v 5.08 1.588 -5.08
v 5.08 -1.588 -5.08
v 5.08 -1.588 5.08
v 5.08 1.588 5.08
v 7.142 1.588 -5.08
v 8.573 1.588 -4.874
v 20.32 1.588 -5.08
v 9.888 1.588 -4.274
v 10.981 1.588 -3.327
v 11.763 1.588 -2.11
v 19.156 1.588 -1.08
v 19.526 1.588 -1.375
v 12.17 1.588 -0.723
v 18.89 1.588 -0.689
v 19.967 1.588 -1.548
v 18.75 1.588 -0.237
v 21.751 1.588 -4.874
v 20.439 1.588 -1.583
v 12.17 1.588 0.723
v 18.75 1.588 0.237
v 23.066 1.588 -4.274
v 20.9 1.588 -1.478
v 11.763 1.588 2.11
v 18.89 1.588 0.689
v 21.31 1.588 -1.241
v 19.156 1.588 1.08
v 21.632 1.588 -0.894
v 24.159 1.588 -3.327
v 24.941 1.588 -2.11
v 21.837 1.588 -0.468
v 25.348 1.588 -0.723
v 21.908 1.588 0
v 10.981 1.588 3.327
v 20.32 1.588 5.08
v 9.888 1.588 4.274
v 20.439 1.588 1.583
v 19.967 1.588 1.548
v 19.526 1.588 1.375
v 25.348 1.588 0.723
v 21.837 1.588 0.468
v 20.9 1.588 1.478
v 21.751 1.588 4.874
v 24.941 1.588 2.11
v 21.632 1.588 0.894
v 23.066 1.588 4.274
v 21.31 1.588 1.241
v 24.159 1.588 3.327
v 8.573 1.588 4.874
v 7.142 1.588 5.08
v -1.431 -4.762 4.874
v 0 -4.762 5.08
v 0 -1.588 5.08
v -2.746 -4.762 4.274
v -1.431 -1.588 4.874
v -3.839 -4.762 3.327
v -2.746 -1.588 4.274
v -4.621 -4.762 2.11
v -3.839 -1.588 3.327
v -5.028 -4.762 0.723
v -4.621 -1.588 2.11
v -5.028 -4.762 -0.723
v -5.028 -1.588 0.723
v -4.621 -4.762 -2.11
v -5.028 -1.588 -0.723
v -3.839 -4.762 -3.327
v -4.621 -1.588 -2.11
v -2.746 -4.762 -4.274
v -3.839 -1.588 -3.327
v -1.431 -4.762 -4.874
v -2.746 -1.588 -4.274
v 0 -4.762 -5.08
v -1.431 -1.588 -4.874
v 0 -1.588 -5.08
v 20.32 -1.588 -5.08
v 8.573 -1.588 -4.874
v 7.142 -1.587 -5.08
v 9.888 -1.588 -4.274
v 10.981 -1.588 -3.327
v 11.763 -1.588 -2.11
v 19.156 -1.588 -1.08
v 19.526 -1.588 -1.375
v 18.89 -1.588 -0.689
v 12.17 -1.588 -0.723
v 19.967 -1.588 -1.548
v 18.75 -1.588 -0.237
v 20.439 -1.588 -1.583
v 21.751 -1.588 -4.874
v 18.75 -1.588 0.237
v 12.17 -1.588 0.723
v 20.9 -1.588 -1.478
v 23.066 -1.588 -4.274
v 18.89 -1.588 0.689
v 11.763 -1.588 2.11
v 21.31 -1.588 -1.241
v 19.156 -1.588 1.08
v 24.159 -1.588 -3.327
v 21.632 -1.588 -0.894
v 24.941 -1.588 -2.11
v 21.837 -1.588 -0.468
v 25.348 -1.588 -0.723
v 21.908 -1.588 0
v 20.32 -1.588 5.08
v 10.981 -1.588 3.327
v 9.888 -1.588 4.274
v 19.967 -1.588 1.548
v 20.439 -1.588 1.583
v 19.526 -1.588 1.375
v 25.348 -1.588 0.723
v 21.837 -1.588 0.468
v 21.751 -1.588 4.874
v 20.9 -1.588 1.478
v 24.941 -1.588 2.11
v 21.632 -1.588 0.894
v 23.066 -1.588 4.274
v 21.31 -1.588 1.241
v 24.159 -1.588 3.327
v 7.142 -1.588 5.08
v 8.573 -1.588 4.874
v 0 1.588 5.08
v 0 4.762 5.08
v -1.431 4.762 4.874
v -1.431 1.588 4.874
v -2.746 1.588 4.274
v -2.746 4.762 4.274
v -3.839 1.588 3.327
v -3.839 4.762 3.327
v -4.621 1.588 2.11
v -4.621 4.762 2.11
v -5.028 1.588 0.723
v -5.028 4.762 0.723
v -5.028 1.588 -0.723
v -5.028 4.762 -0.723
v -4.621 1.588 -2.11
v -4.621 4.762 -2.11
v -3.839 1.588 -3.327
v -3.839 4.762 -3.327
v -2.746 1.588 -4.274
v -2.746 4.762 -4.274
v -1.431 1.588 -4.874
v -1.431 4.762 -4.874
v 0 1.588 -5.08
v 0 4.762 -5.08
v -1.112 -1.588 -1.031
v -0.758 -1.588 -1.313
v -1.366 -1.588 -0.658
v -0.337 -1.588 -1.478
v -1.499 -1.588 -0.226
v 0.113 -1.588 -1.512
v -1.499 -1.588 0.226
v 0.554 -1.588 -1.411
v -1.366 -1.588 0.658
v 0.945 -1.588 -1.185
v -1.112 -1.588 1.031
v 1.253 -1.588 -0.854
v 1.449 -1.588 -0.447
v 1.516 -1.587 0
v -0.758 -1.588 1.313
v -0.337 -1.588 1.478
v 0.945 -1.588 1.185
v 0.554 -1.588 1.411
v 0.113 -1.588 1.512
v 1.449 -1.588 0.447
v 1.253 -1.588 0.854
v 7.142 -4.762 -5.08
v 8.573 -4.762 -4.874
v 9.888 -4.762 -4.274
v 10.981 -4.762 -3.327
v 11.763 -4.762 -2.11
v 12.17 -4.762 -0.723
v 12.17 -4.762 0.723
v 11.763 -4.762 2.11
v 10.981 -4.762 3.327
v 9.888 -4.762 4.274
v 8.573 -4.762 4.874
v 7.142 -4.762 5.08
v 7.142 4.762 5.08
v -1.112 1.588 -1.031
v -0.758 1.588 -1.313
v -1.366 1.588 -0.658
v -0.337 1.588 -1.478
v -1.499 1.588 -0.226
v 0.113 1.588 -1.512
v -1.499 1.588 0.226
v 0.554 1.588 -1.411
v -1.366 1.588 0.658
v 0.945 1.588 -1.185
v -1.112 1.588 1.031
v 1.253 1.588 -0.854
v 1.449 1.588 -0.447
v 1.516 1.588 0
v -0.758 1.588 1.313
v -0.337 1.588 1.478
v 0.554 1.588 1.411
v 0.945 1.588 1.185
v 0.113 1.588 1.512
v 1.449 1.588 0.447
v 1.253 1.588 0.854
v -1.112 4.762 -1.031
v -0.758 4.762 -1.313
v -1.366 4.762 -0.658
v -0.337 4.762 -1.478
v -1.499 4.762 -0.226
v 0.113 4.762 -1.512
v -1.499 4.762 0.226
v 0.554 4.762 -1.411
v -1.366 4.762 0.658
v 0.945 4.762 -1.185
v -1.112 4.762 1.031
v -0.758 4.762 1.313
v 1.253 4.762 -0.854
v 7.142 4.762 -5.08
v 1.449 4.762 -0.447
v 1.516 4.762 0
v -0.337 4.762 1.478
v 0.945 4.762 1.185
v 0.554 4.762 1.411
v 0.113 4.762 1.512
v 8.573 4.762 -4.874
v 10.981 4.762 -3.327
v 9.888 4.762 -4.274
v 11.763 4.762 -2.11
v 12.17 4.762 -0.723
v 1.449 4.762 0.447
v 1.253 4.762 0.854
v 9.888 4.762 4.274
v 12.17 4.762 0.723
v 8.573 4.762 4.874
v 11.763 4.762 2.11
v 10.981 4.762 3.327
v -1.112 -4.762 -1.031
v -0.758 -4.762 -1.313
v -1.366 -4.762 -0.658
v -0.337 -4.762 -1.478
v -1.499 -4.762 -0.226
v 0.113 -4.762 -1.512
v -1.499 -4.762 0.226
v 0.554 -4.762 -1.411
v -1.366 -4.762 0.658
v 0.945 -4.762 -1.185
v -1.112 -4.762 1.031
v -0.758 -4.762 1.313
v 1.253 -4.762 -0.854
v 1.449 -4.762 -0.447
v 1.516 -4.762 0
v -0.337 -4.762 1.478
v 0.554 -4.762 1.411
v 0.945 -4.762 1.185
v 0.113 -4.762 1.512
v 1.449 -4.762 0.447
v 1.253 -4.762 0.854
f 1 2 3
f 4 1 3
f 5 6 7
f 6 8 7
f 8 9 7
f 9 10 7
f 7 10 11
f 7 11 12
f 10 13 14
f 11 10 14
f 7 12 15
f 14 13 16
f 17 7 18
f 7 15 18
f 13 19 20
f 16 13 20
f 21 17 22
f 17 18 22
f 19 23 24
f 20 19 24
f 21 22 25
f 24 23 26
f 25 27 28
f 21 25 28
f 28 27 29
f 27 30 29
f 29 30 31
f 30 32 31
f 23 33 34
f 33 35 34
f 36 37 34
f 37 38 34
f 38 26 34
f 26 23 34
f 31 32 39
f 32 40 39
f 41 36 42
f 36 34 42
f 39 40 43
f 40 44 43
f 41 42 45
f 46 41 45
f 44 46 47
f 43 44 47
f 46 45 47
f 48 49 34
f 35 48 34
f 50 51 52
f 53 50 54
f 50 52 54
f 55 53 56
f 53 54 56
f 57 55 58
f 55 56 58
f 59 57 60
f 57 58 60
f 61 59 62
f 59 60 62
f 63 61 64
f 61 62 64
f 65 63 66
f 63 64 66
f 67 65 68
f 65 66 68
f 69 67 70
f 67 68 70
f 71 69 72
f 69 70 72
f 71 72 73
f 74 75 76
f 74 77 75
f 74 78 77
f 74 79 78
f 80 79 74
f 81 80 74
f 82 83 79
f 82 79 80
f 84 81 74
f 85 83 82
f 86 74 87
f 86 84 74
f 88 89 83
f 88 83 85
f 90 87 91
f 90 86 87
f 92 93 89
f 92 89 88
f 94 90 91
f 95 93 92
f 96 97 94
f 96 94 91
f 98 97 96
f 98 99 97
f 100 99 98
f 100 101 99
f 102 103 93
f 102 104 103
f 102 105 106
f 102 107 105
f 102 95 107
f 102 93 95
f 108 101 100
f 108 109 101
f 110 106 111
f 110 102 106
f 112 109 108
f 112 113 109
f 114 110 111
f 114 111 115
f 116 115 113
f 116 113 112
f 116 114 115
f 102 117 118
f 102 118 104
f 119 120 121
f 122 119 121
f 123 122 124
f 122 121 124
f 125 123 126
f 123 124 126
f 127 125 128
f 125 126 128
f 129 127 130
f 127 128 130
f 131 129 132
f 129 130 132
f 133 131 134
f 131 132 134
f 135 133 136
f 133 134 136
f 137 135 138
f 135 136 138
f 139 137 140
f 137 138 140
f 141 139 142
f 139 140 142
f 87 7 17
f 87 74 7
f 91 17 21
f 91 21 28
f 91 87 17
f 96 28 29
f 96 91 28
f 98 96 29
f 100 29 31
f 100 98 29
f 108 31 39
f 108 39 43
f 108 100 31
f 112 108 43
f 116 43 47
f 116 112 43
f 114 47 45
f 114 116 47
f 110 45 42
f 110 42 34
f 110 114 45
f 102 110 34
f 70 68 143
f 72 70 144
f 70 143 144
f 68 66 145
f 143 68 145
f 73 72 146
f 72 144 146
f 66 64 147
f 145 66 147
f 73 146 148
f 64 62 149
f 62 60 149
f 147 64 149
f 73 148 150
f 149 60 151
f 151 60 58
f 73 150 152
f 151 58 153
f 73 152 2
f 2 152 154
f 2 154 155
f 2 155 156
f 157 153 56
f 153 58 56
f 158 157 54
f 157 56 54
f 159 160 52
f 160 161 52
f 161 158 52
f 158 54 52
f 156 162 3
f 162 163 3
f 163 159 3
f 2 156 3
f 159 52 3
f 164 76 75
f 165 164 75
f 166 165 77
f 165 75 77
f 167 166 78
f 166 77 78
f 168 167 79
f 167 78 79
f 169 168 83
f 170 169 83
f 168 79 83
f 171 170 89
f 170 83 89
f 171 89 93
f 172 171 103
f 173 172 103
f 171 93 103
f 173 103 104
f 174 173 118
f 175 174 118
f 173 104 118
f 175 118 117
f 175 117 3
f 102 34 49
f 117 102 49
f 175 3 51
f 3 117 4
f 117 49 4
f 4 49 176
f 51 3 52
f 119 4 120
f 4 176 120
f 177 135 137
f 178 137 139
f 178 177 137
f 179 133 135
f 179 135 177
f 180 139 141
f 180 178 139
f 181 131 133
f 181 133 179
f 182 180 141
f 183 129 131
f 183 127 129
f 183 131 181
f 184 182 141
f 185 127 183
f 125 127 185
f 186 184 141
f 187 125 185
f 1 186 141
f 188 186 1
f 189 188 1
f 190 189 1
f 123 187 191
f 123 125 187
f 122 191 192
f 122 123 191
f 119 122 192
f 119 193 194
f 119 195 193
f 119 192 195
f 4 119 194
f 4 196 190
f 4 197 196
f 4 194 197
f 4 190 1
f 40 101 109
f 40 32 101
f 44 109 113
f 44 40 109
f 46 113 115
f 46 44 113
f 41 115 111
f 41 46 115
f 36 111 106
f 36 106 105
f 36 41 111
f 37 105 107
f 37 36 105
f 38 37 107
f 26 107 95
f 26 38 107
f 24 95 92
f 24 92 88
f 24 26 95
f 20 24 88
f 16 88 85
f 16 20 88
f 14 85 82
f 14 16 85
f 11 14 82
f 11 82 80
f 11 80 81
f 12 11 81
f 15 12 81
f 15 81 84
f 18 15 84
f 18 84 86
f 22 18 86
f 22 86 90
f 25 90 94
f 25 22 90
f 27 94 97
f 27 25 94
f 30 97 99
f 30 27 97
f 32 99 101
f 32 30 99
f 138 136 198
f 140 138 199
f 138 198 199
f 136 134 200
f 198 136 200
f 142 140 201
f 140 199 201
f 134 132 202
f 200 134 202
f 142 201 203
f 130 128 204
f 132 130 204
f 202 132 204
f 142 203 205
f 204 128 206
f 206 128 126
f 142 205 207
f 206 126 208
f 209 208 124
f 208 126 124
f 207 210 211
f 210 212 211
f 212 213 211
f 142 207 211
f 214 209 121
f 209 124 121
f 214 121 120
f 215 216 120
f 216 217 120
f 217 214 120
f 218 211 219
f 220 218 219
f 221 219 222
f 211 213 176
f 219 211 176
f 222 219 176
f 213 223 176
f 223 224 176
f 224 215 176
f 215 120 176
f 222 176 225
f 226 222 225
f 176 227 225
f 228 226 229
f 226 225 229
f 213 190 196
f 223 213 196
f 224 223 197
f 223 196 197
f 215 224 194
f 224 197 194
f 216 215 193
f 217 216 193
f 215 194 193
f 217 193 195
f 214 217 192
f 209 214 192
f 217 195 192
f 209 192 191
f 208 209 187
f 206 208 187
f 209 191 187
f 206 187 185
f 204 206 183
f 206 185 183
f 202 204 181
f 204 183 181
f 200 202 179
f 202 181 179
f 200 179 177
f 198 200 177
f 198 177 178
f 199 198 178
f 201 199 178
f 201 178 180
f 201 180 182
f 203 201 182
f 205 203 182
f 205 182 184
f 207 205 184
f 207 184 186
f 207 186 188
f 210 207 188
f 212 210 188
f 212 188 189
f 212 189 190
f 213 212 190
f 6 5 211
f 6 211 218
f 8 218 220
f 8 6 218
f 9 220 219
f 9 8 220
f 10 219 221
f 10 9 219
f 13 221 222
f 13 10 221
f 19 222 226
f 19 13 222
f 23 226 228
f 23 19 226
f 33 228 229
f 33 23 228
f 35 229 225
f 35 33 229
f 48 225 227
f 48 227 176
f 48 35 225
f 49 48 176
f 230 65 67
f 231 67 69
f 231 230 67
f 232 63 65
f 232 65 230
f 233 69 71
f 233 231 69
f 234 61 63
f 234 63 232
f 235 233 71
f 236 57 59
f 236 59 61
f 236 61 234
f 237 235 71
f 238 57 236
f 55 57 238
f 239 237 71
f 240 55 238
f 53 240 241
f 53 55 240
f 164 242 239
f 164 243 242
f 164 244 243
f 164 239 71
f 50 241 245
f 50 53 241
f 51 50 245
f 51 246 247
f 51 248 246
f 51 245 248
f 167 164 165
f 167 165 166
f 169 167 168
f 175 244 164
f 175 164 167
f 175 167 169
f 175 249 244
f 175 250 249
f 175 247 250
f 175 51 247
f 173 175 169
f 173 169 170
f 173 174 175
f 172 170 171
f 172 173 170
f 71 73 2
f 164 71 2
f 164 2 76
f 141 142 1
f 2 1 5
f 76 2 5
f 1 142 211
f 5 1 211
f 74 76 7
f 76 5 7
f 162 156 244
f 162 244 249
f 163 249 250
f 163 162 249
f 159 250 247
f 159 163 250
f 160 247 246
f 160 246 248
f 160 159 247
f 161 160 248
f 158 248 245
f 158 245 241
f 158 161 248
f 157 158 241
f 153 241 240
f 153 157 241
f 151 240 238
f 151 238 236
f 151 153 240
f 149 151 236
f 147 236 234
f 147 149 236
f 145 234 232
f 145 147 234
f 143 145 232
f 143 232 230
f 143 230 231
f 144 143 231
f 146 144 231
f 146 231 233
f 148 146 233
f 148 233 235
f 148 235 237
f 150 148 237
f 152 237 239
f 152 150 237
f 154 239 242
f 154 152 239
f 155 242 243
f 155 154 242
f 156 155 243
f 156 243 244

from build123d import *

# Parameters (mm, degrees)
F0_R          = 1.5875
F1_DEPTH      = 1.5875
F1_DEPTH_BACK = 1.5875
F2_R          = 1.516292
F3_DEPTH      = 3.175
F3_DEPTH_BACK = 6.35
F4_W          = 11.43
F4_H          = 10.16
F5_DEPTH      = 3.175


with BuildPart() as f1:
    # F0 (on Front) → F1 (new body, two sides)
    with BuildSketch(Plane.XZ) as f1_sk:
        with BuildLine():
            Line((20.32, 5.08), (0, 5.08))
            ThreePointArc((0, 5.08), (-5.08, 0), (0, -5.08))
            Line((0, -5.08), (20.32, -5.08))
            ThreePointArc((20.32, -5.08), (25.4, 0), (20.32, 5.08))
        make_face()
        Circle(F0_R, mode=Mode.SUBTRACT)
        with Locations((20.32, 0)):
            Circle(F0_R, mode=Mode.SUBTRACT)
    extrude(amount=F1_DEPTH)
    extrude(f1_sk.sketch, amount=-F1_DEPTH_BACK)

    # F2 (on face) → F3 (join, two sides)
    with BuildSketch(Plane.XZ.offset(1.5875)) as f3_sk:
        with BuildLine():
            Line((7.141738, 5.08), (0, 5.08))
            ThreePointArc((0, 5.08), (-5.08, 0), (0, -5.08))
            Line((0, -5.08), (7.141738, -5.08))
            ThreePointArc((7.141738, -5.08), (12.221738, 0), (7.141738, 5.08))
        make_face()
        Circle(F2_R, mode=Mode.SUBTRACT)
    extrude(amount=F3_DEPTH)
    extrude(f3_sk.sketch, amount=-F3_DEPTH_BACK)

    # F4 (on face) → F5 (cut)
    with BuildSketch(Plane.XZ.offset(1.5875)):
        with Locations((-0.635, 0)):
            Rectangle(F4_W, F4_H)
    extrude(amount=-F5_DEPTH, mode=Mode.SUBTRACT)


solid = f1.part
